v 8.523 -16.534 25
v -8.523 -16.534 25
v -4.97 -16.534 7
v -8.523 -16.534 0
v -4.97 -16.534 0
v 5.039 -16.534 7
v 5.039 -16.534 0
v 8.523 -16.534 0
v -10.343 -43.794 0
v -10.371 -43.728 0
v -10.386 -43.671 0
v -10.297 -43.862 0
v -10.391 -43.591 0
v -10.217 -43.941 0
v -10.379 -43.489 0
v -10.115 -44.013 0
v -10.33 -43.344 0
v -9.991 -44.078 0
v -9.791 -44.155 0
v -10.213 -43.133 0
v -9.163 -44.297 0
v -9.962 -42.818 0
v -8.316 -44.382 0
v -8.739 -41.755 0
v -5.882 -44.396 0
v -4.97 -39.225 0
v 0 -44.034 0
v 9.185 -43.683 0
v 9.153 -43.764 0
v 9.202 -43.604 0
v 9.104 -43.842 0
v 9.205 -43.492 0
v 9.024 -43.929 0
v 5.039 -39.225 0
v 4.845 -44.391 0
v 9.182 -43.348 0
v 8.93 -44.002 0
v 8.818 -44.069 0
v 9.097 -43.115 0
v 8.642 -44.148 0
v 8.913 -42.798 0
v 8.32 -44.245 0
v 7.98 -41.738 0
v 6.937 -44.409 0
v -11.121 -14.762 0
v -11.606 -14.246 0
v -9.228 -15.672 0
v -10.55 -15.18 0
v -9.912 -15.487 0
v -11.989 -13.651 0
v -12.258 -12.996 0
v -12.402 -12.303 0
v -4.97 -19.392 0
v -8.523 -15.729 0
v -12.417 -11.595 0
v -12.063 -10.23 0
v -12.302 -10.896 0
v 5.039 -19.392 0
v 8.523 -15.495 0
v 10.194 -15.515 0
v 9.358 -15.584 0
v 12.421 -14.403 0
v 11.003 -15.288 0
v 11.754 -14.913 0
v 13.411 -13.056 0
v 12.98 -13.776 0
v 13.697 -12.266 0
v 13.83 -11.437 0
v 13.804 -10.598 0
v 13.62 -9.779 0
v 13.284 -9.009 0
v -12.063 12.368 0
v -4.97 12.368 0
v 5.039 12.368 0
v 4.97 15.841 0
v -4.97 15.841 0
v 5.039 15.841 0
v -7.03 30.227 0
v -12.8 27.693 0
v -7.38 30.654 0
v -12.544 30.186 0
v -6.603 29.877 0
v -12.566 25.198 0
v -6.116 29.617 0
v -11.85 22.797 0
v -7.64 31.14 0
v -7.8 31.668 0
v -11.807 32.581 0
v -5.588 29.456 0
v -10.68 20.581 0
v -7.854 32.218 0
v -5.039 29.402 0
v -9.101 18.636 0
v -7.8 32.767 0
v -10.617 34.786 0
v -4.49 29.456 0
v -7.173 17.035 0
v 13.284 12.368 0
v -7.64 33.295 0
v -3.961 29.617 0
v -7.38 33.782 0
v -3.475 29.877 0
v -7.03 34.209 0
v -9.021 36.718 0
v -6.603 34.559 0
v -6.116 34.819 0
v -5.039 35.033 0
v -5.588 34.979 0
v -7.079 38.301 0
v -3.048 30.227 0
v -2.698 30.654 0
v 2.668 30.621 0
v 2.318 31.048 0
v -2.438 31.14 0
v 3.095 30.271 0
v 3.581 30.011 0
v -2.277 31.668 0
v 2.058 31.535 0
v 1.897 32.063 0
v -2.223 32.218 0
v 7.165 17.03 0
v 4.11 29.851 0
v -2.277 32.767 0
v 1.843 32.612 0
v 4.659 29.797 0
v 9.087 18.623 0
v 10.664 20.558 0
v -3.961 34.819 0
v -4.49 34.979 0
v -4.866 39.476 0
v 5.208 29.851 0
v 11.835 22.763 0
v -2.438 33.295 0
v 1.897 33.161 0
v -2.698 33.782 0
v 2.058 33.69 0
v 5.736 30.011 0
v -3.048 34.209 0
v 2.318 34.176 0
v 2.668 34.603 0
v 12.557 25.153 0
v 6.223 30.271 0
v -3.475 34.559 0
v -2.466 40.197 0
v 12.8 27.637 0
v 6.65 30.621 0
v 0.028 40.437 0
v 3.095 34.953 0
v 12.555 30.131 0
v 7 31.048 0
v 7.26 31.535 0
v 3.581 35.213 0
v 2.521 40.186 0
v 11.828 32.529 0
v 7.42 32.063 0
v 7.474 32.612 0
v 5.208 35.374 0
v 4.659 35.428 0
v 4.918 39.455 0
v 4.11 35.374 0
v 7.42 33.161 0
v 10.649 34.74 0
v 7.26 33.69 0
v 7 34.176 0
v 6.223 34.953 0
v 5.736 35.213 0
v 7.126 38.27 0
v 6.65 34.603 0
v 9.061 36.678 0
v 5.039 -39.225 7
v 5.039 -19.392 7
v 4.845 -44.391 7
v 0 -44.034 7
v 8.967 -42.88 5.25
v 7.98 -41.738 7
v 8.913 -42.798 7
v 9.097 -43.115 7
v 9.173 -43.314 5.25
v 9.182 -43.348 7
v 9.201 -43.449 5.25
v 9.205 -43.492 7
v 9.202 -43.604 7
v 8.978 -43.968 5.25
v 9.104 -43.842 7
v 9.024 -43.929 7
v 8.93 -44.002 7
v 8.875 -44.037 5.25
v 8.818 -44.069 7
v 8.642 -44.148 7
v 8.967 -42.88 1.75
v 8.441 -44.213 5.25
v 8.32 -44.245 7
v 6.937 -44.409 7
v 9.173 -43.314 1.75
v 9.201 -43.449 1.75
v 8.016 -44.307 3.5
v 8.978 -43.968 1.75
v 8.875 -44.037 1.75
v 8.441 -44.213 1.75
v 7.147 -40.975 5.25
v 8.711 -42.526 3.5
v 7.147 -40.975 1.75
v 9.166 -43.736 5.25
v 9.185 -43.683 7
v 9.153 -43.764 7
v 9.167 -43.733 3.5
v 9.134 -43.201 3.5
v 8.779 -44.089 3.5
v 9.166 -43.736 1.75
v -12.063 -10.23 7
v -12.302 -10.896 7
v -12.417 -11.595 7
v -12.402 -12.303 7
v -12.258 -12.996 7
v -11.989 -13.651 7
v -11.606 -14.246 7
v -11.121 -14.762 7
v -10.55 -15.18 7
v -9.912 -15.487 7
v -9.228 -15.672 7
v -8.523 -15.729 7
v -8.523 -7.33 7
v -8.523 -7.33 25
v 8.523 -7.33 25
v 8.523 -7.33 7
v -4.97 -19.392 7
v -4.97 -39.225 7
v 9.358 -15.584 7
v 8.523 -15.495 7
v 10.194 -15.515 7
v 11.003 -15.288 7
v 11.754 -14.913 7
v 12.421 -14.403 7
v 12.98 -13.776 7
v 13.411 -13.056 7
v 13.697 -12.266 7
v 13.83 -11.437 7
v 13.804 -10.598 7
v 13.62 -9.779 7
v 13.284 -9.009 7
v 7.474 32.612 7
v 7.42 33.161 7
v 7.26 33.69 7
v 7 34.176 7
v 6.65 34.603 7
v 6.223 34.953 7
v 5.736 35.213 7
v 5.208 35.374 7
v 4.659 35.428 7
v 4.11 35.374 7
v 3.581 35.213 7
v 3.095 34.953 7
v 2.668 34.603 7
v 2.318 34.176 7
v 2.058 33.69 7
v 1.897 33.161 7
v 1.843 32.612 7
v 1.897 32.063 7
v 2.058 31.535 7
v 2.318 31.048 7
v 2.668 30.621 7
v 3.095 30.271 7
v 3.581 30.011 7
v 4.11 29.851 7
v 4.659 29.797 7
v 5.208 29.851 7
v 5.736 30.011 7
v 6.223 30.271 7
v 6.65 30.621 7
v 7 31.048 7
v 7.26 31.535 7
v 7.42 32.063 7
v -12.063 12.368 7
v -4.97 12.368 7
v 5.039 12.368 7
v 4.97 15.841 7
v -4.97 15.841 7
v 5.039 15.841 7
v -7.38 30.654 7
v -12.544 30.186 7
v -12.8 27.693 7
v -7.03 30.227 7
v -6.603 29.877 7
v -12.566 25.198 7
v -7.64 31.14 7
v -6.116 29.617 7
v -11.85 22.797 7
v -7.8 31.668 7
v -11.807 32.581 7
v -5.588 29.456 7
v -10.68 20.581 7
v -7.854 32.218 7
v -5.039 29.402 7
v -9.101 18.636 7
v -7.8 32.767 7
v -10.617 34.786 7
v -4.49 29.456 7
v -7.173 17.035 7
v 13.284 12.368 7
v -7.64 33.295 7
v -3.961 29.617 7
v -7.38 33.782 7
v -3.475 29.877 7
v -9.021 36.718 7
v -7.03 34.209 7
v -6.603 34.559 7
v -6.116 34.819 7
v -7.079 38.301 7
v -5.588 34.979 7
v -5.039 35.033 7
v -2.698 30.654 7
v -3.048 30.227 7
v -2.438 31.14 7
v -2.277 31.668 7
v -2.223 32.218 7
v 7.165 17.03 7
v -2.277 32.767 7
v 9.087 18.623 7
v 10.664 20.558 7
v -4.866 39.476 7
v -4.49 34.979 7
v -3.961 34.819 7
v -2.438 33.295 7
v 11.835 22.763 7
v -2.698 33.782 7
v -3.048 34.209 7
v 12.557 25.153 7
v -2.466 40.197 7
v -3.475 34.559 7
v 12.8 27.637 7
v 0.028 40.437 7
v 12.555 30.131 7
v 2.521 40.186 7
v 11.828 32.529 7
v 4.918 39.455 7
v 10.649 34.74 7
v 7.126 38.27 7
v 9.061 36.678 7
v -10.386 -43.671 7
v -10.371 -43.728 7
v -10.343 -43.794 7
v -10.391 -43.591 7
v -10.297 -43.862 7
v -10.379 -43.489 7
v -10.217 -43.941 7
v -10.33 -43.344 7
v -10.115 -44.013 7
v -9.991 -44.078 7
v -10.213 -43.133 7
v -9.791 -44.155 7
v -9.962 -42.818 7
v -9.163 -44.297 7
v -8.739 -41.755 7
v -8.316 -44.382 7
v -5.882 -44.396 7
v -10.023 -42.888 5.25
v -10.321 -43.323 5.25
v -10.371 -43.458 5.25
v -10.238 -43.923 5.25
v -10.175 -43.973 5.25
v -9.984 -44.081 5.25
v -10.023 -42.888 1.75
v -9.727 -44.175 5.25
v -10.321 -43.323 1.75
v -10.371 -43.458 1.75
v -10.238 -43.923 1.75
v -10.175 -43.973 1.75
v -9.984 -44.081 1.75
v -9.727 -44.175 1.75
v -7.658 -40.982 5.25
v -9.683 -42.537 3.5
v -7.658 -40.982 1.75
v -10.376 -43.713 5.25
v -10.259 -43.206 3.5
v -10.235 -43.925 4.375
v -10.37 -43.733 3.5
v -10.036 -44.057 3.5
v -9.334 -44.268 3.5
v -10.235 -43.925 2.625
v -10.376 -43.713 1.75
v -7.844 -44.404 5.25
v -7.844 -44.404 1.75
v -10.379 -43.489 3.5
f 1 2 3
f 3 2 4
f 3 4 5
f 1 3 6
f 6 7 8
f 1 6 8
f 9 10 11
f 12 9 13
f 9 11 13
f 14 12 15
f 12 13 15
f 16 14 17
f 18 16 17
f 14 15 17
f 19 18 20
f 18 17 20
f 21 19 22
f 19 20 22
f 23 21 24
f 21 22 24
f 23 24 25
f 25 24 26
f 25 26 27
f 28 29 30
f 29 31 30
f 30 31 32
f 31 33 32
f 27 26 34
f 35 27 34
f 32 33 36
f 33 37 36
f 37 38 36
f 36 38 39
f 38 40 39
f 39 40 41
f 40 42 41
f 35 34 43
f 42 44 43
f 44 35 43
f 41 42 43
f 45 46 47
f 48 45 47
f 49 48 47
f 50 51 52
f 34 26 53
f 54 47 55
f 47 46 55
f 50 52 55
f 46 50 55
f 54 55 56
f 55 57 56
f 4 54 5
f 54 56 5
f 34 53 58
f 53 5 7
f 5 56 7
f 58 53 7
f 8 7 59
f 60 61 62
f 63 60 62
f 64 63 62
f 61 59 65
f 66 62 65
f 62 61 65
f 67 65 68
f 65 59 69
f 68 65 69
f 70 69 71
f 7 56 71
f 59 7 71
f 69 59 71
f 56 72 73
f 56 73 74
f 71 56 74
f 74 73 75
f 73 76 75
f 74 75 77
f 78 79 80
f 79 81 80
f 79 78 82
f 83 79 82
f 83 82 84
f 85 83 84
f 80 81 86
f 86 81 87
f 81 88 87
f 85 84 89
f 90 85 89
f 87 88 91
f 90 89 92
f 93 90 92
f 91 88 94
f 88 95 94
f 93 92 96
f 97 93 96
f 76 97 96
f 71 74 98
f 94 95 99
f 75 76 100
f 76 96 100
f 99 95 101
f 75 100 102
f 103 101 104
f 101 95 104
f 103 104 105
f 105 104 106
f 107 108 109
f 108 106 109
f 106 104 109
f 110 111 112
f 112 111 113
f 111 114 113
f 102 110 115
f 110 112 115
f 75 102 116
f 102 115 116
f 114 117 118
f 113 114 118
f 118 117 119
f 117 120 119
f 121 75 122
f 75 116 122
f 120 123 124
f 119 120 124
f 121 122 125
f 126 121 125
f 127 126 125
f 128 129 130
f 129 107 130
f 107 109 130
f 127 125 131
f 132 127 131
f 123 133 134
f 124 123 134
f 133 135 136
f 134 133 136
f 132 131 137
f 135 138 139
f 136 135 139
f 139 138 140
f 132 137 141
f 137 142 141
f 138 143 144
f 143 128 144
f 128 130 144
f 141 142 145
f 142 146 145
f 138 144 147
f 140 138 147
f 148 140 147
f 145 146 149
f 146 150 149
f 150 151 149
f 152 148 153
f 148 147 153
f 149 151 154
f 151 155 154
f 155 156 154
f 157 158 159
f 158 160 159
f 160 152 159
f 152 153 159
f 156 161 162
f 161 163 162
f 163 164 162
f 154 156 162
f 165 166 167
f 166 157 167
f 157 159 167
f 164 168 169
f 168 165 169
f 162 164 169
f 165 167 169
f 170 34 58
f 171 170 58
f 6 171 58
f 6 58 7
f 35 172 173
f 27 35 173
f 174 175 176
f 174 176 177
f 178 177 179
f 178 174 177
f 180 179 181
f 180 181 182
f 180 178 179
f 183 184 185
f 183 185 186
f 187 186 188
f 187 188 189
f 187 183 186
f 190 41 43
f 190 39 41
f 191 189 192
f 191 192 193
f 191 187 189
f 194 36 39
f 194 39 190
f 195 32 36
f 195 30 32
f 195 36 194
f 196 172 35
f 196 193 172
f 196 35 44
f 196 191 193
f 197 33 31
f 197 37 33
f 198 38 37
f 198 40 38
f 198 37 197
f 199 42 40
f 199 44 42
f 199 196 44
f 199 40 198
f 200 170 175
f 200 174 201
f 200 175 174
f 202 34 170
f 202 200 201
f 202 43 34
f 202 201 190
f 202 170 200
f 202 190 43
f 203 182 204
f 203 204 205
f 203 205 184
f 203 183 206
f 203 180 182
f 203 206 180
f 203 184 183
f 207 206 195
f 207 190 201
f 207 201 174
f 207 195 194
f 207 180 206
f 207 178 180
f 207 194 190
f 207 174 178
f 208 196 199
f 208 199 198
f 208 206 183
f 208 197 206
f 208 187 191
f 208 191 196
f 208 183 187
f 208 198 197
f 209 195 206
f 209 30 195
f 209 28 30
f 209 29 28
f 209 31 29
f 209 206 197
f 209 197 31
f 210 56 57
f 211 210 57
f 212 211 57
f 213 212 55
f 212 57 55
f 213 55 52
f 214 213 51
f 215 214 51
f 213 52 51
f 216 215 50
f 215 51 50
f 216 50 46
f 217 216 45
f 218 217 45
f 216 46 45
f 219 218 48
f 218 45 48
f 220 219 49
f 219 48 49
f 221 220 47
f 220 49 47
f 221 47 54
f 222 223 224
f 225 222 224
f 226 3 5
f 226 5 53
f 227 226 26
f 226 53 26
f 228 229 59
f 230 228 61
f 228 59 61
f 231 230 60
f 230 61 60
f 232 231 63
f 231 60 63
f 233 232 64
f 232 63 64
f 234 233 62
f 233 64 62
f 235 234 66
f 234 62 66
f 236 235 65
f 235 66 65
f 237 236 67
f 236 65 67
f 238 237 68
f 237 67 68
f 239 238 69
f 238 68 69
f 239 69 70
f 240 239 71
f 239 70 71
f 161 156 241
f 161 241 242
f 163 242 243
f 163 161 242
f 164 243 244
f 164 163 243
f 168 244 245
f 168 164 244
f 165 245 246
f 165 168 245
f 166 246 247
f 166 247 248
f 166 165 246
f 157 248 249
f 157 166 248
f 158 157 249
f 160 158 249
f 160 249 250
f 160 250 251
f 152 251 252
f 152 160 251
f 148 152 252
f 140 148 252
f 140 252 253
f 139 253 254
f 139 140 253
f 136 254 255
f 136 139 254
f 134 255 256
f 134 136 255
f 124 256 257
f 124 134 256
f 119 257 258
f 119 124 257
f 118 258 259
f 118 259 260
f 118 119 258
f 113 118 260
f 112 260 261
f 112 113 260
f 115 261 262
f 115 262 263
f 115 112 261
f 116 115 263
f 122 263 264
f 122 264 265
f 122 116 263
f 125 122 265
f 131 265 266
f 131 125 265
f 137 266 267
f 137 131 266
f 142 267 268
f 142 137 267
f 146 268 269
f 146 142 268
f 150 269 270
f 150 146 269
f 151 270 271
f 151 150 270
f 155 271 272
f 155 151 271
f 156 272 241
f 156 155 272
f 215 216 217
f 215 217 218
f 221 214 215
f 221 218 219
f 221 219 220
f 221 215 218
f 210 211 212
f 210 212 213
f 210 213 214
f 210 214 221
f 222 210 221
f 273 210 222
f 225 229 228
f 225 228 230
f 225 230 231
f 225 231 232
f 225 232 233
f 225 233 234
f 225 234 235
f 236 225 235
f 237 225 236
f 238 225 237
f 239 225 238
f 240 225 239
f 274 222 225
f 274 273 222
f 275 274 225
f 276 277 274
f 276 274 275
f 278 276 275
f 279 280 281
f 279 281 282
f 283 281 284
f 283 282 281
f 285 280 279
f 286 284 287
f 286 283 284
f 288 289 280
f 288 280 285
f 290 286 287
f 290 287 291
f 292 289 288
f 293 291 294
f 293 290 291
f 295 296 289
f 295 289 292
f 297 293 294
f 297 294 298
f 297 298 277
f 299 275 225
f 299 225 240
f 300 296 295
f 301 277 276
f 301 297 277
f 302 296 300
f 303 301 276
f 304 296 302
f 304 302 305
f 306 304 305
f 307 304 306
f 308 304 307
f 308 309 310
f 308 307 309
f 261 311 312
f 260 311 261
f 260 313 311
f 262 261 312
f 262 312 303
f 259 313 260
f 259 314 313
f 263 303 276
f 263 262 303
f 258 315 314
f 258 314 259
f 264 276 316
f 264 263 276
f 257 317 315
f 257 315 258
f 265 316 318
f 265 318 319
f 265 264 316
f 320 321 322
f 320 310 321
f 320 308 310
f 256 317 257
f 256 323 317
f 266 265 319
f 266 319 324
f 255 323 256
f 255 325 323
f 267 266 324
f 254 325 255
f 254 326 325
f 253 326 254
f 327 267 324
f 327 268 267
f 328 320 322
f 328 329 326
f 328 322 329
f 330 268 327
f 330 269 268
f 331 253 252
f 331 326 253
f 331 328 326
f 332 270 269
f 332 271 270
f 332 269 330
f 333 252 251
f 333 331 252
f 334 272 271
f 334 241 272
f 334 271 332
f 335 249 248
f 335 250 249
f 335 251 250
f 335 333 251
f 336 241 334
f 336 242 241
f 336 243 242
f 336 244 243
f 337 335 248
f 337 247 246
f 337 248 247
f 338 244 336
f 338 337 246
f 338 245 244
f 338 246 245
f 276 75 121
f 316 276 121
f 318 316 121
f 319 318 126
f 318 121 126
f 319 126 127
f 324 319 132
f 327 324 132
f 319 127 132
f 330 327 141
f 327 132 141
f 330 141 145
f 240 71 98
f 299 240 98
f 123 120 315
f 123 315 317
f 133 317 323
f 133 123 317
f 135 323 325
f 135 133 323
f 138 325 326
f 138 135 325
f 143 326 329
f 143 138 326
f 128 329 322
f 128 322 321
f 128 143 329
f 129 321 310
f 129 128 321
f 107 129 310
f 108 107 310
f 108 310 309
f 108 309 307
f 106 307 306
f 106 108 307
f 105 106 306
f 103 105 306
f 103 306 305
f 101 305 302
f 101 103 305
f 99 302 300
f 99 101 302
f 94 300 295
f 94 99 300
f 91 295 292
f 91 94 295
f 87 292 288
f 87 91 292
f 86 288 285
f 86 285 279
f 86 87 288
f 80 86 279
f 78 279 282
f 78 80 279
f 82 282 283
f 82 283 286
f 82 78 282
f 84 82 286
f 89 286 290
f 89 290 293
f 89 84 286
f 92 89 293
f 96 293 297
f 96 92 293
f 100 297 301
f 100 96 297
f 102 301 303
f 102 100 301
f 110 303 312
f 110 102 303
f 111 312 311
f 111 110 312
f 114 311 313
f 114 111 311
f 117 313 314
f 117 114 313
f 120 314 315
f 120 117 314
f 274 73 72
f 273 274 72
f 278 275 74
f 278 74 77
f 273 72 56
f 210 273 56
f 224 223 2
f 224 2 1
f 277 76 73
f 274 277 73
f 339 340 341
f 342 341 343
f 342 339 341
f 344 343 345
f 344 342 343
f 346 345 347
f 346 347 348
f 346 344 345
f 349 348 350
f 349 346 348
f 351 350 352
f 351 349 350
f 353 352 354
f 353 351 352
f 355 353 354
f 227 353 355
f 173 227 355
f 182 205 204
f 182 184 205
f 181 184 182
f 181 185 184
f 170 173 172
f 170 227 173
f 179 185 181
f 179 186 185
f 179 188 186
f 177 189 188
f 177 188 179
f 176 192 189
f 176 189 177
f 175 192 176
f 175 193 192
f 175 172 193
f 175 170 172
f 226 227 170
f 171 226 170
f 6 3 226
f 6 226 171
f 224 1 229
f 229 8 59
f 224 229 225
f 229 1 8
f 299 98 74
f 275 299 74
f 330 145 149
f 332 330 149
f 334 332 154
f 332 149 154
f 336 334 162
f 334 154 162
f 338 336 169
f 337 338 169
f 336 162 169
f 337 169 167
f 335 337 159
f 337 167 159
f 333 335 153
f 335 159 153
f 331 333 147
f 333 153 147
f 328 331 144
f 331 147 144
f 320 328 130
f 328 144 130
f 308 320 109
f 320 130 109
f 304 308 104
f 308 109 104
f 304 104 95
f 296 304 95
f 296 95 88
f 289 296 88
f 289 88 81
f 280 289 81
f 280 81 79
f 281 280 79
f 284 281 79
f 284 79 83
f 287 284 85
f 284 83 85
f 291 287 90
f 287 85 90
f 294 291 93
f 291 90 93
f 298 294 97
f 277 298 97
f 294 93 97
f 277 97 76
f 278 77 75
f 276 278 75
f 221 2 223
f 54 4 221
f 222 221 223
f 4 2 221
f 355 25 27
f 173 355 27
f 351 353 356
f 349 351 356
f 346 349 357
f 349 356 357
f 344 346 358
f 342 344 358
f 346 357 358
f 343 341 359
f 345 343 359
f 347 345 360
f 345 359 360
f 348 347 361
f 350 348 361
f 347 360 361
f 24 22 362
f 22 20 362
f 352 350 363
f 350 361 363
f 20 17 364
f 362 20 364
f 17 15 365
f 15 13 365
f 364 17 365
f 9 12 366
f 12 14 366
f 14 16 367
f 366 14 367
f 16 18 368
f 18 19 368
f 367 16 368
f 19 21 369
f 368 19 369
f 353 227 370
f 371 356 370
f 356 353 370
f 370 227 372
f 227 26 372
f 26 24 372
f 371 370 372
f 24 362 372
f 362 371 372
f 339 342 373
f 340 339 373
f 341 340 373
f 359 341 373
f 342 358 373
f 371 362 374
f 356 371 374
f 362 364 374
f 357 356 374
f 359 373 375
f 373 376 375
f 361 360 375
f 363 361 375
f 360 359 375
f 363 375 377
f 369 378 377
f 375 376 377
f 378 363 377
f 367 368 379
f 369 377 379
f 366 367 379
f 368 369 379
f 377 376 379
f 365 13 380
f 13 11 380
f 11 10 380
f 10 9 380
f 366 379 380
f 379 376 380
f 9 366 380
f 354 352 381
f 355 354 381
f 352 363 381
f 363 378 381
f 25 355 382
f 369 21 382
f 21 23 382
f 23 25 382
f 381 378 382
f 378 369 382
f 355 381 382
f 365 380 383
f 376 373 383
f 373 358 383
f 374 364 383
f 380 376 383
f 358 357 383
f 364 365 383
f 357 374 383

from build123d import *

# Parameters (mm, degrees)
F0_W     = 5.0387987867
F0_H     = 19.8329761624
F0_R     = 2.8154783611
F0_R_2   = 2.8155
F0_W_2   = 4.9696583821
F1_DEPTH = 7
F2_W     = 17.0454550534
F2_H     = 9.2045464553
F3_DEPTH = 25


with BuildPart() as f1:
    # F0 (on Top) → F1 (new body)
    with BuildSketch(Plane.XY):
        with BuildLine():
            ThreePointArc((4.9696583821, 15.8411743726), (0, 14.8370421052), (-4.9696583821, 15.8411743726))
            Line((-4.9696583821, 15.8411743726), (-4.9696583821, 12.3679572716))
            Line((-4.9696583821, 12.3679572716), (-4.9696583821, -13.2841039449))
            Line((-4.9696583821, -13.2841039449), (-4.9696583821, -19.3917378783))
            Line((-4.9696583821, -19.3917378783), (0, -19.3917378783))
            Line((0, -19.3917378783), (5.0387987867, -19.3917378783))
            Line((5.0387987867, -19.3917378783), (5.0387987867, -11.8726156652))
            Line((5.0387987867, -11.8726156652), (5.0387987867, 12.3679572716))
            Line((5.0387987867, 12.3679572716), (5.0387987867, 15.8411743726))
            Line((5.0387987867, 15.8411743726), (4.9696583821, 15.8411743726))
        make_face()
        with BuildLine():
            Line((13.2841020823, 12.3679572716), (5.0387987867, 12.3679572716))
            Line((5.0387987867, 12.3679572716), (5.0387987867, -11.8726156652))
            ThreePointArc((5.0387987867, -11.8726156652), (10.8629911852, -15.3395790039), (13.2841020823, -9.0087596327))
            Line((13.2841020823, -9.0087596327), (13.2841020823, 12.3679572716))
        make_face()
        with BuildLine():
            Line((-4.9696583821, -13.2841039449), (-4.9696583821, 12.3679572716))
            Line((-4.9696583821, 12.3679572716), (-12.0625765994, 12.3679572716))
            Line((-12.0625765994, 12.3679572716), (-12.0625765994, -10.2302869782))
            ThreePointArc((-12.0625765994, -10.2302869782), (-10.0908850734, -15.4148140408), (-4.9696583821, -13.2841039449))
        make_face()
        with BuildLine():
            Line((5.0387987867, -39.2247140408), (0, -39.2247140408))
            Line((0, -39.2247140408), (0, -44.0338738263))
            add(Edge.make_bspline(
                [(5.0387987867, -39.2247140408), (7.2849400651, -41.0469321938), (12.2823824367, -45.1011875053), (4.3610338087, -44.4128386617), (0, -44.0338738263)],
                knots=[0, 0, 0, 0, 0.4494581651, 1, 1, 1, 1], degree=3))
        make_face()
        with Locations((2.5193993933, -29.3082259595)):
            Rectangle(F0_W, F0_H)
        with BuildLine():
            ThreePointArc((4.9696583821, 15.8411743726), (10.6642305698, 20.5579047033), (12.8, 27.6370421052))
            ThreePointArc((12.8, 27.6370421052), (-7.0791374019, 38.301272675), (-4.9696583821, 15.8411743726))
            ThreePointArc((-4.9696583821, 15.8411743726), (0, 14.8370421052), (4.9696583821, 15.8411743726))
        make_face()
        with Locations((-5.0387978554, 32.2177670896)):
            Circle(F0_R, mode=Mode.SUBTRACT)
        with Locations((4.6588750556, 32.61211887)):
            Circle(F0_R_2, mode=Mode.SUBTRACT)
        with BuildLine():
            Line((0, -39.2247140408), (-4.9696583821, -39.2247140408))
            add(Edge.make_bspline(
                [(-4.9696583821, -39.2247140408), (-7.8188484205, -41.0482913635), (-14.1279975934, -45.086358745), (-5.0037621436, -44.4066360778), (0, -44.0338738263)],
                knots=[0, 0, 0, 0, 0.4515965561, 1, 1, 1, 1], degree=3))
            Line((0, -44.0338738263), (0, -39.2247140408))
        make_face()
        with Locations((-2.484829191, -29.3082259595)):
            Rectangle(F0_W_2, F0_H)
    extrude(amount=F1_DEPTH)

    # F2 (on Top) → F3 (join)
    with BuildSketch(Plane.XY):
        with Locations((9.313e-07, -11.9318186771)):
            Rectangle(F2_W, F2_H)
    extrude(amount=F3_DEPTH)


solid = f1.part
